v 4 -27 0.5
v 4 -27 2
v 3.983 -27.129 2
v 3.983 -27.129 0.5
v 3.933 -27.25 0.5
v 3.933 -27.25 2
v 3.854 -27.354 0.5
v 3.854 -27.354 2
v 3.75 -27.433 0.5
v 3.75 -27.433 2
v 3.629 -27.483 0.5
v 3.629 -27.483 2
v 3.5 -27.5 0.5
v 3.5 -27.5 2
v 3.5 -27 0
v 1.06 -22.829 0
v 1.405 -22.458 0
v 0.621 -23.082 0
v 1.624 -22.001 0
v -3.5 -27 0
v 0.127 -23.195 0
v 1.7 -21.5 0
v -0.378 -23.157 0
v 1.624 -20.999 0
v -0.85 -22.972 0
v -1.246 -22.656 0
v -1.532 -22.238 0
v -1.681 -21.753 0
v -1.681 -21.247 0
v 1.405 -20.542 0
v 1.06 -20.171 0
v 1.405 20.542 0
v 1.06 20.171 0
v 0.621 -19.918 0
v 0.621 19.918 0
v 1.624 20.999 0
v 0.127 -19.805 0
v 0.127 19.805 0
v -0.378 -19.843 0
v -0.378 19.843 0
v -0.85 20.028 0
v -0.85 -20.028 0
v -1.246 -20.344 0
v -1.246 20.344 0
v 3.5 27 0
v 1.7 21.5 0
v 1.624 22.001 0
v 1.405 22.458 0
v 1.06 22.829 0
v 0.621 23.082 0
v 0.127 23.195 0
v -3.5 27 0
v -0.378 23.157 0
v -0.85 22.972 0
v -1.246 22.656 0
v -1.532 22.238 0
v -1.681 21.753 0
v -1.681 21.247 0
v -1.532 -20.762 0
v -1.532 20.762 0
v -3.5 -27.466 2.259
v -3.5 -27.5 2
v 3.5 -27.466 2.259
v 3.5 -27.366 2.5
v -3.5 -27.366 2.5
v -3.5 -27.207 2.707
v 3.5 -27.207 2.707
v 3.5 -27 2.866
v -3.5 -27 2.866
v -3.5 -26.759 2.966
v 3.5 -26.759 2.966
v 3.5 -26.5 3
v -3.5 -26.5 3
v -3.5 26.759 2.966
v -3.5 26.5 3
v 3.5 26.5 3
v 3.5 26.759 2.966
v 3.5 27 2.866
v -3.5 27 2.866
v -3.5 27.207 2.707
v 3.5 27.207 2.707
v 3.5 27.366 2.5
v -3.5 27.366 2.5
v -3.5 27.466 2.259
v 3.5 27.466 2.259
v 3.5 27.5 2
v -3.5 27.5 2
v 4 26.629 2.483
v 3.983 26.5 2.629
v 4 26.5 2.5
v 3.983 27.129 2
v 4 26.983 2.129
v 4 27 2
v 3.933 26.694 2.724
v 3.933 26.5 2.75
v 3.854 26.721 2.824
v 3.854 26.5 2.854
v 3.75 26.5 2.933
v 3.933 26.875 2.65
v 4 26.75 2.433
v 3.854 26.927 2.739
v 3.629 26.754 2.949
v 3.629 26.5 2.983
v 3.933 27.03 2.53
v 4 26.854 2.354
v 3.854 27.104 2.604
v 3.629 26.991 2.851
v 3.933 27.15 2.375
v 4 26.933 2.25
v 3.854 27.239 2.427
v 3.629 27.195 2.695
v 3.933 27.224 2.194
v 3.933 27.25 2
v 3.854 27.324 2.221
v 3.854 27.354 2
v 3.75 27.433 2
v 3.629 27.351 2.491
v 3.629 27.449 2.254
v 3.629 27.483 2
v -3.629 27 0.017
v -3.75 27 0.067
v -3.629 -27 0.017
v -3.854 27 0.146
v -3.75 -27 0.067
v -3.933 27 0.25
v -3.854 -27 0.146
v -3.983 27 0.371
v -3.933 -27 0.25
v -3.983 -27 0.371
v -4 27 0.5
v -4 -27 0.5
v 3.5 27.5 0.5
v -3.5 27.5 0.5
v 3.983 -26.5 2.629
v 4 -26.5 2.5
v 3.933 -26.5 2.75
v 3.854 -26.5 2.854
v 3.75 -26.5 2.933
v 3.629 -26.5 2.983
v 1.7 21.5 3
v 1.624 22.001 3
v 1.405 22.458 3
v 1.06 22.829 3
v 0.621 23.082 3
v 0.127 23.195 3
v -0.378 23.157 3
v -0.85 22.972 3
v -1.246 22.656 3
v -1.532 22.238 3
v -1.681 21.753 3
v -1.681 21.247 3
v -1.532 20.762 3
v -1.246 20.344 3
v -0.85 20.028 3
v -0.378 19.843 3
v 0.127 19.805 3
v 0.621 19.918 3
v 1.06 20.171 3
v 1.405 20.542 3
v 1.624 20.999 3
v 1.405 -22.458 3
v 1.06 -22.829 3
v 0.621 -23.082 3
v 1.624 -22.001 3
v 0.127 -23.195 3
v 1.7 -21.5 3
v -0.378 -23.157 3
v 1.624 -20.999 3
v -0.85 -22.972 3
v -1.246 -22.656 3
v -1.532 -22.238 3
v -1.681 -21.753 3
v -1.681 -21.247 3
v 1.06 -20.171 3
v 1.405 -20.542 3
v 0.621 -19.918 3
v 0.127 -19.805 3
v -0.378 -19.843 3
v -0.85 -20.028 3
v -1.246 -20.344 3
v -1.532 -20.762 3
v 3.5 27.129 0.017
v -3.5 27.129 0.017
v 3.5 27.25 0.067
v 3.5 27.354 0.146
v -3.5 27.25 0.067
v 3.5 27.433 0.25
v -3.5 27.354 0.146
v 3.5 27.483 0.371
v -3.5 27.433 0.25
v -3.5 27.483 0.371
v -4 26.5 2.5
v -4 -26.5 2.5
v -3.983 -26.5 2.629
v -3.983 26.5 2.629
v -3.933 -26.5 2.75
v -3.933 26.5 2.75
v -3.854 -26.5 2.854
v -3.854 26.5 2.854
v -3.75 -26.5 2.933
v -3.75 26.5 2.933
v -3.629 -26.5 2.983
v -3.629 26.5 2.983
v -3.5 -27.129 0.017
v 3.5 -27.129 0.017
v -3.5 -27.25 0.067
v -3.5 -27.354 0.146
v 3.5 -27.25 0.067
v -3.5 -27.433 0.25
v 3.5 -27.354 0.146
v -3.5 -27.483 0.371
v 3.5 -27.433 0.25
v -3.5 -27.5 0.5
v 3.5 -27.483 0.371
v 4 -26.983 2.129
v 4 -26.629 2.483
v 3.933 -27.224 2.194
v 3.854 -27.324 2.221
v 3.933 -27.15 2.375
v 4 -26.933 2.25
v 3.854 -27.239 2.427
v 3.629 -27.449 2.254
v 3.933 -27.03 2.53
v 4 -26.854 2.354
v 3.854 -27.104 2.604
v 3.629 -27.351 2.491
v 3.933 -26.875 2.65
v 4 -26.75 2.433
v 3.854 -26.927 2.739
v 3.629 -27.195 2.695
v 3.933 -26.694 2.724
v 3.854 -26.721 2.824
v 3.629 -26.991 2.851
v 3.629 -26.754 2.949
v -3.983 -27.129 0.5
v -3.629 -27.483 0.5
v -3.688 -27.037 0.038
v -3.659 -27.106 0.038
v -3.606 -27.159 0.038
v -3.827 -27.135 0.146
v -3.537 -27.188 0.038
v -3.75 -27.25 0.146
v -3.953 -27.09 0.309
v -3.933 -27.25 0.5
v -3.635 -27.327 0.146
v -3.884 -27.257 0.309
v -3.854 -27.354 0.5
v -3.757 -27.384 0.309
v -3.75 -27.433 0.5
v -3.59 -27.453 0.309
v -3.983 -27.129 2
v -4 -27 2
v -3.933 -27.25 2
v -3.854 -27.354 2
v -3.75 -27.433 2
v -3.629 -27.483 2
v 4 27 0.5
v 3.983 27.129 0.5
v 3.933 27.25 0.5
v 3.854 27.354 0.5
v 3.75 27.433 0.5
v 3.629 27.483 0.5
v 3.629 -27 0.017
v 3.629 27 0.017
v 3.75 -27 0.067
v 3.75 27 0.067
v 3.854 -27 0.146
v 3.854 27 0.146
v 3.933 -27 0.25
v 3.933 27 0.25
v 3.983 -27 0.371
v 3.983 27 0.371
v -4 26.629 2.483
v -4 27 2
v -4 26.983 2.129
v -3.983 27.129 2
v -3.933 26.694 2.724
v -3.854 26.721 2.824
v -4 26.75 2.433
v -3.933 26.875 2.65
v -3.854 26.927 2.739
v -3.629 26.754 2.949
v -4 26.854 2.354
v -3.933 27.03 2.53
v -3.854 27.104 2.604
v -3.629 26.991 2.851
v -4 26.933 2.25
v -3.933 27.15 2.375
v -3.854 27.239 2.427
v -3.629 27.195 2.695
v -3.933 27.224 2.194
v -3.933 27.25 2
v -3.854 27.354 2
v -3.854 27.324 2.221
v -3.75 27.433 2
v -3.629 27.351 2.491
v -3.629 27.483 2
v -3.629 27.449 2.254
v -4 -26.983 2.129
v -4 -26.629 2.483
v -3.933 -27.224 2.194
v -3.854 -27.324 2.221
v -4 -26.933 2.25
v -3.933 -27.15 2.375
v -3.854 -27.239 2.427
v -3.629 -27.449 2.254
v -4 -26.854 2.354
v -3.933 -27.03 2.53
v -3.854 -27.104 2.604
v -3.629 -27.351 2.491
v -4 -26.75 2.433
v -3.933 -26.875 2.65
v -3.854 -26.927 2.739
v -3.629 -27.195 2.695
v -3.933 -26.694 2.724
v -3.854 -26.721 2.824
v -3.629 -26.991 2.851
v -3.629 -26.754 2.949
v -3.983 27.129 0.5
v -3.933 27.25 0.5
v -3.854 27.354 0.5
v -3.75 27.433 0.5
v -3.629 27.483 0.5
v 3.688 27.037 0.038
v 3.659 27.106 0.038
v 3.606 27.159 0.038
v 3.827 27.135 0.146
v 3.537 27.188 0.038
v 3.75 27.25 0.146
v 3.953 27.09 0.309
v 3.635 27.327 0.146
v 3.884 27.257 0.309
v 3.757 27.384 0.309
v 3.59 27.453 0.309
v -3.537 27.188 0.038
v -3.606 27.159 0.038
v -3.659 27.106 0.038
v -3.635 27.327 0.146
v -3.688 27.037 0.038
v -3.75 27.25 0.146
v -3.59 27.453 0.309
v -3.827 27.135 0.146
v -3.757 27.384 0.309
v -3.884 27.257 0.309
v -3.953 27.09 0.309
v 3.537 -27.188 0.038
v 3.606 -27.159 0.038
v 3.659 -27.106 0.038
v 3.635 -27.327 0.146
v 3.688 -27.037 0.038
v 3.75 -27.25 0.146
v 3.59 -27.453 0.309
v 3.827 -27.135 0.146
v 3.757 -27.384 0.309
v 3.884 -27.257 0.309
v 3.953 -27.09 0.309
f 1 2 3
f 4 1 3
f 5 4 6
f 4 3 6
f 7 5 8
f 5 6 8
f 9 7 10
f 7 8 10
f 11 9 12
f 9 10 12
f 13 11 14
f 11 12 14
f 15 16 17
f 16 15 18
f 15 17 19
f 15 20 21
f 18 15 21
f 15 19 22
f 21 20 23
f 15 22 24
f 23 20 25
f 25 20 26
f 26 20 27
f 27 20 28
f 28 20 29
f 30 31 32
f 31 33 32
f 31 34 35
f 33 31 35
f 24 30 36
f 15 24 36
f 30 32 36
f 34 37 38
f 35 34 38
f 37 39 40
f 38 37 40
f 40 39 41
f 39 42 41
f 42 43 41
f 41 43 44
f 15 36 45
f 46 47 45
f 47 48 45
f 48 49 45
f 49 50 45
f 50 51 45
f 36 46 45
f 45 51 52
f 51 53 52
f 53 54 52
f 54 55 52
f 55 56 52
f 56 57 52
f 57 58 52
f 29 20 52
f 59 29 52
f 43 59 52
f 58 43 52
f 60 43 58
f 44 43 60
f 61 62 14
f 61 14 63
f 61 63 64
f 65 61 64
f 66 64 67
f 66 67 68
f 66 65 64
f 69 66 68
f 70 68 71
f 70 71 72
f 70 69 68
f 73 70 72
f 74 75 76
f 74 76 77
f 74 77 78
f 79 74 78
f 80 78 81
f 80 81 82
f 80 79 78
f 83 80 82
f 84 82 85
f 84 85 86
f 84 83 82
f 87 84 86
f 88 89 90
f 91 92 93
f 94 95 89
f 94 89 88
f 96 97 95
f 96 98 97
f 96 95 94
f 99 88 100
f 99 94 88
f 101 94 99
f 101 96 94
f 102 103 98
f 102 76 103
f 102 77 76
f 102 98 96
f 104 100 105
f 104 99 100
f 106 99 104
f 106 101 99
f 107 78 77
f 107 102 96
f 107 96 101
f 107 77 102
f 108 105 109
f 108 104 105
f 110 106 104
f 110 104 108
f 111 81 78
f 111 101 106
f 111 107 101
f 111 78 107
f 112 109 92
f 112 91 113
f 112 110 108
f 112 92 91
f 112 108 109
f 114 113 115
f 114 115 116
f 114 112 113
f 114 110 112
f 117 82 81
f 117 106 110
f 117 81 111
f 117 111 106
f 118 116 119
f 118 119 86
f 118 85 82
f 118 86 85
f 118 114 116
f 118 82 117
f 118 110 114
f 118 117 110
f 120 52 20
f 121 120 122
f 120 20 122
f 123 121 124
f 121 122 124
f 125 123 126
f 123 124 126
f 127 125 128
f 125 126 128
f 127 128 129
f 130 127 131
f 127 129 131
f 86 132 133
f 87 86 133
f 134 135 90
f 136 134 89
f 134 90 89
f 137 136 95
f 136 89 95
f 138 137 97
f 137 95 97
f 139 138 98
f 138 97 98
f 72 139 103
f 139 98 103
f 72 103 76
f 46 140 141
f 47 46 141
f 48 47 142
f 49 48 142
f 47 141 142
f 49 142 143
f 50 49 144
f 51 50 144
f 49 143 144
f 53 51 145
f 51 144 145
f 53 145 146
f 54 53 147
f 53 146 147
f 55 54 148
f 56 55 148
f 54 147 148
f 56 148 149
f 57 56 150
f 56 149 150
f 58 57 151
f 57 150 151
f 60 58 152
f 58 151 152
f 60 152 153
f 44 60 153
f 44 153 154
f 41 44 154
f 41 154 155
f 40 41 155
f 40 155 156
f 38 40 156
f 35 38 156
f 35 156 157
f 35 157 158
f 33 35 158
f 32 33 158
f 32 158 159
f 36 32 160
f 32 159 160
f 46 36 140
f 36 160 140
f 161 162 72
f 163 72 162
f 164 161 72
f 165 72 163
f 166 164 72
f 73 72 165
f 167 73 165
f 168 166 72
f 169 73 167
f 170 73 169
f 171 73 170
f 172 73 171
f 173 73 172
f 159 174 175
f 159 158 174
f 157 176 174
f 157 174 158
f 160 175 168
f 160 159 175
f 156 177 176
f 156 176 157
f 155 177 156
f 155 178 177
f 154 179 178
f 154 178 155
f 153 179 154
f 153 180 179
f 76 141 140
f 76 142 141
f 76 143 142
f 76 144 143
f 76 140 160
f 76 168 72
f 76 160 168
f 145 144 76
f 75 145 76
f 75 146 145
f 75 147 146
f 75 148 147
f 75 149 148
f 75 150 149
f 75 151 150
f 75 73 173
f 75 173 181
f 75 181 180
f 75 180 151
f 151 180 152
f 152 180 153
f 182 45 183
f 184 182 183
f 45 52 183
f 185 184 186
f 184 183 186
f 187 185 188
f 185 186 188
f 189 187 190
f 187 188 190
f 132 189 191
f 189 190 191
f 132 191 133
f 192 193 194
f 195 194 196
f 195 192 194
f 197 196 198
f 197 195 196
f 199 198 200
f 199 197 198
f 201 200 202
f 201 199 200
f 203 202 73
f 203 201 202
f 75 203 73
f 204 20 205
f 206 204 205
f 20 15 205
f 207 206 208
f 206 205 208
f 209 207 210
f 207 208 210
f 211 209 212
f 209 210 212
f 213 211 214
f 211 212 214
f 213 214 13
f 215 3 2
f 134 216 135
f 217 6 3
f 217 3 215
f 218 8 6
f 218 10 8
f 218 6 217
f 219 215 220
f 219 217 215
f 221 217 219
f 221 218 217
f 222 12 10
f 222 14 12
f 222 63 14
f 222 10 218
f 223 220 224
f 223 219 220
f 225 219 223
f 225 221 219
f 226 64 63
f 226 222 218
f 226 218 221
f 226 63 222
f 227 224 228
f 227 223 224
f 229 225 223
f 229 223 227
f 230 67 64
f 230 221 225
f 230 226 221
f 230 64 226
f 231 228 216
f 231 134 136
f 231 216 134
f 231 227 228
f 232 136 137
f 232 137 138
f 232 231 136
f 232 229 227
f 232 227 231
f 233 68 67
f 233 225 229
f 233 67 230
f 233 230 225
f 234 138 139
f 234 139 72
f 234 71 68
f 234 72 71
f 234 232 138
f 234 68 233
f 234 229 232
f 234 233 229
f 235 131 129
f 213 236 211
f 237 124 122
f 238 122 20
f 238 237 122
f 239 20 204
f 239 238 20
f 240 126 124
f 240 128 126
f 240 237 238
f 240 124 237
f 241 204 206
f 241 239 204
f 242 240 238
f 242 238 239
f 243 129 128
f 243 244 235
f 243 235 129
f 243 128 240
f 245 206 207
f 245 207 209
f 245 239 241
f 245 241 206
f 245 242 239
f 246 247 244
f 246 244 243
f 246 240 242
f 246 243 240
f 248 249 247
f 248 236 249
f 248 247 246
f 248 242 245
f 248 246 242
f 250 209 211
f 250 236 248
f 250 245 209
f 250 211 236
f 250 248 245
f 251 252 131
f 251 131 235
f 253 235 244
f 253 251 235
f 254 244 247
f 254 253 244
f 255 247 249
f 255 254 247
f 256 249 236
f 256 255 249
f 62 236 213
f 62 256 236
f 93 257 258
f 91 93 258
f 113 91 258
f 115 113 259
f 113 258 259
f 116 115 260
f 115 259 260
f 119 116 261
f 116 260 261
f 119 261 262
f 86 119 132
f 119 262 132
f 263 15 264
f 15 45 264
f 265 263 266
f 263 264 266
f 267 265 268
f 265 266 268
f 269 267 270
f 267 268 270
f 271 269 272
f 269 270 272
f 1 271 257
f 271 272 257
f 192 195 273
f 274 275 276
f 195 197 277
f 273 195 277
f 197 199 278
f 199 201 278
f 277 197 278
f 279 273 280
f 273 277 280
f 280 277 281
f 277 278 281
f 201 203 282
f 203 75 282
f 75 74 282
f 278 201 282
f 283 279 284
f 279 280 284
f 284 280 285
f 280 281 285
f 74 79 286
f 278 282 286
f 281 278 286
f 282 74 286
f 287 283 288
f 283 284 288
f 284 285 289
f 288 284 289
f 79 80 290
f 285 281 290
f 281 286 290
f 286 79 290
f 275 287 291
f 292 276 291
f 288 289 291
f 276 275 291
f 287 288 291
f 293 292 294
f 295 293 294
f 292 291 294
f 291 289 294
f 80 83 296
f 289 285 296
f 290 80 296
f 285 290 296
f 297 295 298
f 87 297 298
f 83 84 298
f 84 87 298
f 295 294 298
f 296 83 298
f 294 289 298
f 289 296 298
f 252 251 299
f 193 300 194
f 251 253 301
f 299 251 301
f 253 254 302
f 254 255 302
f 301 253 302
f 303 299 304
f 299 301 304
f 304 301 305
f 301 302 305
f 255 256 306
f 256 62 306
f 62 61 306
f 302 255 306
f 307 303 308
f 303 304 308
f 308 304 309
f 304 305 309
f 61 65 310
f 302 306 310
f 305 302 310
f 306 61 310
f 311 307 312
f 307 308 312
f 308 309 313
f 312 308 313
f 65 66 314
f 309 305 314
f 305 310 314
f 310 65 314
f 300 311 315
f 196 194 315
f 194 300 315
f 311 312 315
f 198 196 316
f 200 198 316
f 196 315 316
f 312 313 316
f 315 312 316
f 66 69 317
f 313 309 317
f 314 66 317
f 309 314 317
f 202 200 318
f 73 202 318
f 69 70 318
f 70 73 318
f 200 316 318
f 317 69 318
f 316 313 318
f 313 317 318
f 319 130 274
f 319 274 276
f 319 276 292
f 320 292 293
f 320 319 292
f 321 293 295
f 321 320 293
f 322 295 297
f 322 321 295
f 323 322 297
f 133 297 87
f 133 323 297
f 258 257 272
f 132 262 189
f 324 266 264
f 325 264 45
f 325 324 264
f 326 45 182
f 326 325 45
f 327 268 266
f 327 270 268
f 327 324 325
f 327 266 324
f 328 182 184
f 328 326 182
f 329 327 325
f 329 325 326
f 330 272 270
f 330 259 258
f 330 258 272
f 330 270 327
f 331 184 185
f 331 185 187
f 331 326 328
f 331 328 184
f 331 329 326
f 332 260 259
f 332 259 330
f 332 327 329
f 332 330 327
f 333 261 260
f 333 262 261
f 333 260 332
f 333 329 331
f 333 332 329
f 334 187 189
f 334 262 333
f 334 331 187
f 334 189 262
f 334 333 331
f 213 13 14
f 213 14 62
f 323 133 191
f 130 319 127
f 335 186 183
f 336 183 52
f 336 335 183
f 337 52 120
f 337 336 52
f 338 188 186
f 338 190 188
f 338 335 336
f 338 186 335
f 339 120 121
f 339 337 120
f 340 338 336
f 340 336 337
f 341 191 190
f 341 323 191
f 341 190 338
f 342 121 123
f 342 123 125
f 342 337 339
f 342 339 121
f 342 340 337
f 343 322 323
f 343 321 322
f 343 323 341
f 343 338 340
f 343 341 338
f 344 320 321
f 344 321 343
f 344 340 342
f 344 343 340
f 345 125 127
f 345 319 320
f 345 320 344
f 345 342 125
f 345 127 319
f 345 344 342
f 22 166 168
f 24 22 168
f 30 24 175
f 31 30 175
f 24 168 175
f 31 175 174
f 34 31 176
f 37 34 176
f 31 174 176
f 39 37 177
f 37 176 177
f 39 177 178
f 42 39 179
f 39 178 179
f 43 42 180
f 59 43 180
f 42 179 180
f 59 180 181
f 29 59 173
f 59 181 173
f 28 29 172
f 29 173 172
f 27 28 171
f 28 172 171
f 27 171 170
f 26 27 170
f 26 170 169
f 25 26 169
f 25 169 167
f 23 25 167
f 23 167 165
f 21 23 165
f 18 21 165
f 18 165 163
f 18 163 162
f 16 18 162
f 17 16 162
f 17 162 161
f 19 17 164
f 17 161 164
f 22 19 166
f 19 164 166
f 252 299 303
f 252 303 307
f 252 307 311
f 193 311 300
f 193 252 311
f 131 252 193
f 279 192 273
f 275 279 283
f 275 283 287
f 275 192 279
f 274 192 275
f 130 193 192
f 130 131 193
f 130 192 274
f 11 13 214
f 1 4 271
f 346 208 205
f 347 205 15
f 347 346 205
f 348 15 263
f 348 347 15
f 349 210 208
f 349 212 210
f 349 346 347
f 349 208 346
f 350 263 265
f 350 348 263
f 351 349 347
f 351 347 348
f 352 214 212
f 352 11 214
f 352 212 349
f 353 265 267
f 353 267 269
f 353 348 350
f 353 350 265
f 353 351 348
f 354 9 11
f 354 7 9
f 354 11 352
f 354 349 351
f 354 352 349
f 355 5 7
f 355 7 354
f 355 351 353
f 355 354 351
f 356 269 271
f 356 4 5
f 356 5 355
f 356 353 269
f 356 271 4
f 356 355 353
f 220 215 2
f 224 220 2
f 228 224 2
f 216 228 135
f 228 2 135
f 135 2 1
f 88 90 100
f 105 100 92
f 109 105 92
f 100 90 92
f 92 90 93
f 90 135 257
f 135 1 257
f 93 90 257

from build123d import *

# Parameters (mm, degrees)
SKETCH1_W           = 55
SKETCH1_H           = 8
BOSS_EXTRUDE1_DEPTH = 3
SKETCH2_R           = 1.7
CUT_EXTRUDE1_DEPTH  = 3
FILLET2_R           = 1
FILLET3_R           = 0.5
FILLET4_R           = 0.5


with BuildPart() as part:
    # Sketch1 → Boss-Extrude1 (new body)
    with BuildSketch(Plane(origin=(0, 0, 0), x_dir=(0, 1, 0), z_dir=(0, 0, 1))):
        Rectangle(SKETCH1_W, SKETCH1_H)
    extrude(amount=BOSS_EXTRUDE1_DEPTH)

    # Sketch2 → Cut-Extrude1 (cut)
    with BuildSketch(Plane.XY.offset(3)):
        with Locations((0, 21.5)):
            Circle(SKETCH2_R)
        with Locations((0, -21.5)):
            Circle(SKETCH2_R)
    extrude(amount=-CUT_EXTRUDE1_DEPTH, mode=Mode.SUBTRACT)

    # Fillet2
    fillet2_edges = [part.edges().sort_by_distance(p)[0] for p in [
        (0, 27.5, 3),
        (0, -27.5, 3),
    ]]
    fillet(fillet2_edges, radius=FILLET2_R)

    # Fillet3
    fillet3_edges = [part.edges().sort_by_distance(p)[0] for p in [
        (4, 0, 3),
        (-4, 0, 3),
        (4, 27.5, 1),
        (4, -27.5, 1),
        (4, 27.207106781, 2.707106781),
        (4, -27.207106781, 2.707106781),
        (-4, -27.5, 1),
        (-4, 27.5, 1),
        (-4, 27.207106781, 2.707106781),
        (-4, -27.207106781, 2.707106781),
    ]]
    fillet(fillet3_edges, radius=FILLET3_R)

    # Fillet4
    fillet4_edges = [part.edges().sort_by_distance(p)[0] for p in [
        (4, 0, 0),
        (0, -27.5, 0),
        (-4, 0, 0),
        (0, 27.5, 0),
        (-3.853553391, -27.353553391, 0),
        (-3.853553391, 27.353553391, 0),
        (3.853553391, 27.353553391, 0),
        (3.853553391, -27.353553391, 0),
    ]]
    fillet(fillet4_edges, radius=FILLET4_R)


solid = part.part
